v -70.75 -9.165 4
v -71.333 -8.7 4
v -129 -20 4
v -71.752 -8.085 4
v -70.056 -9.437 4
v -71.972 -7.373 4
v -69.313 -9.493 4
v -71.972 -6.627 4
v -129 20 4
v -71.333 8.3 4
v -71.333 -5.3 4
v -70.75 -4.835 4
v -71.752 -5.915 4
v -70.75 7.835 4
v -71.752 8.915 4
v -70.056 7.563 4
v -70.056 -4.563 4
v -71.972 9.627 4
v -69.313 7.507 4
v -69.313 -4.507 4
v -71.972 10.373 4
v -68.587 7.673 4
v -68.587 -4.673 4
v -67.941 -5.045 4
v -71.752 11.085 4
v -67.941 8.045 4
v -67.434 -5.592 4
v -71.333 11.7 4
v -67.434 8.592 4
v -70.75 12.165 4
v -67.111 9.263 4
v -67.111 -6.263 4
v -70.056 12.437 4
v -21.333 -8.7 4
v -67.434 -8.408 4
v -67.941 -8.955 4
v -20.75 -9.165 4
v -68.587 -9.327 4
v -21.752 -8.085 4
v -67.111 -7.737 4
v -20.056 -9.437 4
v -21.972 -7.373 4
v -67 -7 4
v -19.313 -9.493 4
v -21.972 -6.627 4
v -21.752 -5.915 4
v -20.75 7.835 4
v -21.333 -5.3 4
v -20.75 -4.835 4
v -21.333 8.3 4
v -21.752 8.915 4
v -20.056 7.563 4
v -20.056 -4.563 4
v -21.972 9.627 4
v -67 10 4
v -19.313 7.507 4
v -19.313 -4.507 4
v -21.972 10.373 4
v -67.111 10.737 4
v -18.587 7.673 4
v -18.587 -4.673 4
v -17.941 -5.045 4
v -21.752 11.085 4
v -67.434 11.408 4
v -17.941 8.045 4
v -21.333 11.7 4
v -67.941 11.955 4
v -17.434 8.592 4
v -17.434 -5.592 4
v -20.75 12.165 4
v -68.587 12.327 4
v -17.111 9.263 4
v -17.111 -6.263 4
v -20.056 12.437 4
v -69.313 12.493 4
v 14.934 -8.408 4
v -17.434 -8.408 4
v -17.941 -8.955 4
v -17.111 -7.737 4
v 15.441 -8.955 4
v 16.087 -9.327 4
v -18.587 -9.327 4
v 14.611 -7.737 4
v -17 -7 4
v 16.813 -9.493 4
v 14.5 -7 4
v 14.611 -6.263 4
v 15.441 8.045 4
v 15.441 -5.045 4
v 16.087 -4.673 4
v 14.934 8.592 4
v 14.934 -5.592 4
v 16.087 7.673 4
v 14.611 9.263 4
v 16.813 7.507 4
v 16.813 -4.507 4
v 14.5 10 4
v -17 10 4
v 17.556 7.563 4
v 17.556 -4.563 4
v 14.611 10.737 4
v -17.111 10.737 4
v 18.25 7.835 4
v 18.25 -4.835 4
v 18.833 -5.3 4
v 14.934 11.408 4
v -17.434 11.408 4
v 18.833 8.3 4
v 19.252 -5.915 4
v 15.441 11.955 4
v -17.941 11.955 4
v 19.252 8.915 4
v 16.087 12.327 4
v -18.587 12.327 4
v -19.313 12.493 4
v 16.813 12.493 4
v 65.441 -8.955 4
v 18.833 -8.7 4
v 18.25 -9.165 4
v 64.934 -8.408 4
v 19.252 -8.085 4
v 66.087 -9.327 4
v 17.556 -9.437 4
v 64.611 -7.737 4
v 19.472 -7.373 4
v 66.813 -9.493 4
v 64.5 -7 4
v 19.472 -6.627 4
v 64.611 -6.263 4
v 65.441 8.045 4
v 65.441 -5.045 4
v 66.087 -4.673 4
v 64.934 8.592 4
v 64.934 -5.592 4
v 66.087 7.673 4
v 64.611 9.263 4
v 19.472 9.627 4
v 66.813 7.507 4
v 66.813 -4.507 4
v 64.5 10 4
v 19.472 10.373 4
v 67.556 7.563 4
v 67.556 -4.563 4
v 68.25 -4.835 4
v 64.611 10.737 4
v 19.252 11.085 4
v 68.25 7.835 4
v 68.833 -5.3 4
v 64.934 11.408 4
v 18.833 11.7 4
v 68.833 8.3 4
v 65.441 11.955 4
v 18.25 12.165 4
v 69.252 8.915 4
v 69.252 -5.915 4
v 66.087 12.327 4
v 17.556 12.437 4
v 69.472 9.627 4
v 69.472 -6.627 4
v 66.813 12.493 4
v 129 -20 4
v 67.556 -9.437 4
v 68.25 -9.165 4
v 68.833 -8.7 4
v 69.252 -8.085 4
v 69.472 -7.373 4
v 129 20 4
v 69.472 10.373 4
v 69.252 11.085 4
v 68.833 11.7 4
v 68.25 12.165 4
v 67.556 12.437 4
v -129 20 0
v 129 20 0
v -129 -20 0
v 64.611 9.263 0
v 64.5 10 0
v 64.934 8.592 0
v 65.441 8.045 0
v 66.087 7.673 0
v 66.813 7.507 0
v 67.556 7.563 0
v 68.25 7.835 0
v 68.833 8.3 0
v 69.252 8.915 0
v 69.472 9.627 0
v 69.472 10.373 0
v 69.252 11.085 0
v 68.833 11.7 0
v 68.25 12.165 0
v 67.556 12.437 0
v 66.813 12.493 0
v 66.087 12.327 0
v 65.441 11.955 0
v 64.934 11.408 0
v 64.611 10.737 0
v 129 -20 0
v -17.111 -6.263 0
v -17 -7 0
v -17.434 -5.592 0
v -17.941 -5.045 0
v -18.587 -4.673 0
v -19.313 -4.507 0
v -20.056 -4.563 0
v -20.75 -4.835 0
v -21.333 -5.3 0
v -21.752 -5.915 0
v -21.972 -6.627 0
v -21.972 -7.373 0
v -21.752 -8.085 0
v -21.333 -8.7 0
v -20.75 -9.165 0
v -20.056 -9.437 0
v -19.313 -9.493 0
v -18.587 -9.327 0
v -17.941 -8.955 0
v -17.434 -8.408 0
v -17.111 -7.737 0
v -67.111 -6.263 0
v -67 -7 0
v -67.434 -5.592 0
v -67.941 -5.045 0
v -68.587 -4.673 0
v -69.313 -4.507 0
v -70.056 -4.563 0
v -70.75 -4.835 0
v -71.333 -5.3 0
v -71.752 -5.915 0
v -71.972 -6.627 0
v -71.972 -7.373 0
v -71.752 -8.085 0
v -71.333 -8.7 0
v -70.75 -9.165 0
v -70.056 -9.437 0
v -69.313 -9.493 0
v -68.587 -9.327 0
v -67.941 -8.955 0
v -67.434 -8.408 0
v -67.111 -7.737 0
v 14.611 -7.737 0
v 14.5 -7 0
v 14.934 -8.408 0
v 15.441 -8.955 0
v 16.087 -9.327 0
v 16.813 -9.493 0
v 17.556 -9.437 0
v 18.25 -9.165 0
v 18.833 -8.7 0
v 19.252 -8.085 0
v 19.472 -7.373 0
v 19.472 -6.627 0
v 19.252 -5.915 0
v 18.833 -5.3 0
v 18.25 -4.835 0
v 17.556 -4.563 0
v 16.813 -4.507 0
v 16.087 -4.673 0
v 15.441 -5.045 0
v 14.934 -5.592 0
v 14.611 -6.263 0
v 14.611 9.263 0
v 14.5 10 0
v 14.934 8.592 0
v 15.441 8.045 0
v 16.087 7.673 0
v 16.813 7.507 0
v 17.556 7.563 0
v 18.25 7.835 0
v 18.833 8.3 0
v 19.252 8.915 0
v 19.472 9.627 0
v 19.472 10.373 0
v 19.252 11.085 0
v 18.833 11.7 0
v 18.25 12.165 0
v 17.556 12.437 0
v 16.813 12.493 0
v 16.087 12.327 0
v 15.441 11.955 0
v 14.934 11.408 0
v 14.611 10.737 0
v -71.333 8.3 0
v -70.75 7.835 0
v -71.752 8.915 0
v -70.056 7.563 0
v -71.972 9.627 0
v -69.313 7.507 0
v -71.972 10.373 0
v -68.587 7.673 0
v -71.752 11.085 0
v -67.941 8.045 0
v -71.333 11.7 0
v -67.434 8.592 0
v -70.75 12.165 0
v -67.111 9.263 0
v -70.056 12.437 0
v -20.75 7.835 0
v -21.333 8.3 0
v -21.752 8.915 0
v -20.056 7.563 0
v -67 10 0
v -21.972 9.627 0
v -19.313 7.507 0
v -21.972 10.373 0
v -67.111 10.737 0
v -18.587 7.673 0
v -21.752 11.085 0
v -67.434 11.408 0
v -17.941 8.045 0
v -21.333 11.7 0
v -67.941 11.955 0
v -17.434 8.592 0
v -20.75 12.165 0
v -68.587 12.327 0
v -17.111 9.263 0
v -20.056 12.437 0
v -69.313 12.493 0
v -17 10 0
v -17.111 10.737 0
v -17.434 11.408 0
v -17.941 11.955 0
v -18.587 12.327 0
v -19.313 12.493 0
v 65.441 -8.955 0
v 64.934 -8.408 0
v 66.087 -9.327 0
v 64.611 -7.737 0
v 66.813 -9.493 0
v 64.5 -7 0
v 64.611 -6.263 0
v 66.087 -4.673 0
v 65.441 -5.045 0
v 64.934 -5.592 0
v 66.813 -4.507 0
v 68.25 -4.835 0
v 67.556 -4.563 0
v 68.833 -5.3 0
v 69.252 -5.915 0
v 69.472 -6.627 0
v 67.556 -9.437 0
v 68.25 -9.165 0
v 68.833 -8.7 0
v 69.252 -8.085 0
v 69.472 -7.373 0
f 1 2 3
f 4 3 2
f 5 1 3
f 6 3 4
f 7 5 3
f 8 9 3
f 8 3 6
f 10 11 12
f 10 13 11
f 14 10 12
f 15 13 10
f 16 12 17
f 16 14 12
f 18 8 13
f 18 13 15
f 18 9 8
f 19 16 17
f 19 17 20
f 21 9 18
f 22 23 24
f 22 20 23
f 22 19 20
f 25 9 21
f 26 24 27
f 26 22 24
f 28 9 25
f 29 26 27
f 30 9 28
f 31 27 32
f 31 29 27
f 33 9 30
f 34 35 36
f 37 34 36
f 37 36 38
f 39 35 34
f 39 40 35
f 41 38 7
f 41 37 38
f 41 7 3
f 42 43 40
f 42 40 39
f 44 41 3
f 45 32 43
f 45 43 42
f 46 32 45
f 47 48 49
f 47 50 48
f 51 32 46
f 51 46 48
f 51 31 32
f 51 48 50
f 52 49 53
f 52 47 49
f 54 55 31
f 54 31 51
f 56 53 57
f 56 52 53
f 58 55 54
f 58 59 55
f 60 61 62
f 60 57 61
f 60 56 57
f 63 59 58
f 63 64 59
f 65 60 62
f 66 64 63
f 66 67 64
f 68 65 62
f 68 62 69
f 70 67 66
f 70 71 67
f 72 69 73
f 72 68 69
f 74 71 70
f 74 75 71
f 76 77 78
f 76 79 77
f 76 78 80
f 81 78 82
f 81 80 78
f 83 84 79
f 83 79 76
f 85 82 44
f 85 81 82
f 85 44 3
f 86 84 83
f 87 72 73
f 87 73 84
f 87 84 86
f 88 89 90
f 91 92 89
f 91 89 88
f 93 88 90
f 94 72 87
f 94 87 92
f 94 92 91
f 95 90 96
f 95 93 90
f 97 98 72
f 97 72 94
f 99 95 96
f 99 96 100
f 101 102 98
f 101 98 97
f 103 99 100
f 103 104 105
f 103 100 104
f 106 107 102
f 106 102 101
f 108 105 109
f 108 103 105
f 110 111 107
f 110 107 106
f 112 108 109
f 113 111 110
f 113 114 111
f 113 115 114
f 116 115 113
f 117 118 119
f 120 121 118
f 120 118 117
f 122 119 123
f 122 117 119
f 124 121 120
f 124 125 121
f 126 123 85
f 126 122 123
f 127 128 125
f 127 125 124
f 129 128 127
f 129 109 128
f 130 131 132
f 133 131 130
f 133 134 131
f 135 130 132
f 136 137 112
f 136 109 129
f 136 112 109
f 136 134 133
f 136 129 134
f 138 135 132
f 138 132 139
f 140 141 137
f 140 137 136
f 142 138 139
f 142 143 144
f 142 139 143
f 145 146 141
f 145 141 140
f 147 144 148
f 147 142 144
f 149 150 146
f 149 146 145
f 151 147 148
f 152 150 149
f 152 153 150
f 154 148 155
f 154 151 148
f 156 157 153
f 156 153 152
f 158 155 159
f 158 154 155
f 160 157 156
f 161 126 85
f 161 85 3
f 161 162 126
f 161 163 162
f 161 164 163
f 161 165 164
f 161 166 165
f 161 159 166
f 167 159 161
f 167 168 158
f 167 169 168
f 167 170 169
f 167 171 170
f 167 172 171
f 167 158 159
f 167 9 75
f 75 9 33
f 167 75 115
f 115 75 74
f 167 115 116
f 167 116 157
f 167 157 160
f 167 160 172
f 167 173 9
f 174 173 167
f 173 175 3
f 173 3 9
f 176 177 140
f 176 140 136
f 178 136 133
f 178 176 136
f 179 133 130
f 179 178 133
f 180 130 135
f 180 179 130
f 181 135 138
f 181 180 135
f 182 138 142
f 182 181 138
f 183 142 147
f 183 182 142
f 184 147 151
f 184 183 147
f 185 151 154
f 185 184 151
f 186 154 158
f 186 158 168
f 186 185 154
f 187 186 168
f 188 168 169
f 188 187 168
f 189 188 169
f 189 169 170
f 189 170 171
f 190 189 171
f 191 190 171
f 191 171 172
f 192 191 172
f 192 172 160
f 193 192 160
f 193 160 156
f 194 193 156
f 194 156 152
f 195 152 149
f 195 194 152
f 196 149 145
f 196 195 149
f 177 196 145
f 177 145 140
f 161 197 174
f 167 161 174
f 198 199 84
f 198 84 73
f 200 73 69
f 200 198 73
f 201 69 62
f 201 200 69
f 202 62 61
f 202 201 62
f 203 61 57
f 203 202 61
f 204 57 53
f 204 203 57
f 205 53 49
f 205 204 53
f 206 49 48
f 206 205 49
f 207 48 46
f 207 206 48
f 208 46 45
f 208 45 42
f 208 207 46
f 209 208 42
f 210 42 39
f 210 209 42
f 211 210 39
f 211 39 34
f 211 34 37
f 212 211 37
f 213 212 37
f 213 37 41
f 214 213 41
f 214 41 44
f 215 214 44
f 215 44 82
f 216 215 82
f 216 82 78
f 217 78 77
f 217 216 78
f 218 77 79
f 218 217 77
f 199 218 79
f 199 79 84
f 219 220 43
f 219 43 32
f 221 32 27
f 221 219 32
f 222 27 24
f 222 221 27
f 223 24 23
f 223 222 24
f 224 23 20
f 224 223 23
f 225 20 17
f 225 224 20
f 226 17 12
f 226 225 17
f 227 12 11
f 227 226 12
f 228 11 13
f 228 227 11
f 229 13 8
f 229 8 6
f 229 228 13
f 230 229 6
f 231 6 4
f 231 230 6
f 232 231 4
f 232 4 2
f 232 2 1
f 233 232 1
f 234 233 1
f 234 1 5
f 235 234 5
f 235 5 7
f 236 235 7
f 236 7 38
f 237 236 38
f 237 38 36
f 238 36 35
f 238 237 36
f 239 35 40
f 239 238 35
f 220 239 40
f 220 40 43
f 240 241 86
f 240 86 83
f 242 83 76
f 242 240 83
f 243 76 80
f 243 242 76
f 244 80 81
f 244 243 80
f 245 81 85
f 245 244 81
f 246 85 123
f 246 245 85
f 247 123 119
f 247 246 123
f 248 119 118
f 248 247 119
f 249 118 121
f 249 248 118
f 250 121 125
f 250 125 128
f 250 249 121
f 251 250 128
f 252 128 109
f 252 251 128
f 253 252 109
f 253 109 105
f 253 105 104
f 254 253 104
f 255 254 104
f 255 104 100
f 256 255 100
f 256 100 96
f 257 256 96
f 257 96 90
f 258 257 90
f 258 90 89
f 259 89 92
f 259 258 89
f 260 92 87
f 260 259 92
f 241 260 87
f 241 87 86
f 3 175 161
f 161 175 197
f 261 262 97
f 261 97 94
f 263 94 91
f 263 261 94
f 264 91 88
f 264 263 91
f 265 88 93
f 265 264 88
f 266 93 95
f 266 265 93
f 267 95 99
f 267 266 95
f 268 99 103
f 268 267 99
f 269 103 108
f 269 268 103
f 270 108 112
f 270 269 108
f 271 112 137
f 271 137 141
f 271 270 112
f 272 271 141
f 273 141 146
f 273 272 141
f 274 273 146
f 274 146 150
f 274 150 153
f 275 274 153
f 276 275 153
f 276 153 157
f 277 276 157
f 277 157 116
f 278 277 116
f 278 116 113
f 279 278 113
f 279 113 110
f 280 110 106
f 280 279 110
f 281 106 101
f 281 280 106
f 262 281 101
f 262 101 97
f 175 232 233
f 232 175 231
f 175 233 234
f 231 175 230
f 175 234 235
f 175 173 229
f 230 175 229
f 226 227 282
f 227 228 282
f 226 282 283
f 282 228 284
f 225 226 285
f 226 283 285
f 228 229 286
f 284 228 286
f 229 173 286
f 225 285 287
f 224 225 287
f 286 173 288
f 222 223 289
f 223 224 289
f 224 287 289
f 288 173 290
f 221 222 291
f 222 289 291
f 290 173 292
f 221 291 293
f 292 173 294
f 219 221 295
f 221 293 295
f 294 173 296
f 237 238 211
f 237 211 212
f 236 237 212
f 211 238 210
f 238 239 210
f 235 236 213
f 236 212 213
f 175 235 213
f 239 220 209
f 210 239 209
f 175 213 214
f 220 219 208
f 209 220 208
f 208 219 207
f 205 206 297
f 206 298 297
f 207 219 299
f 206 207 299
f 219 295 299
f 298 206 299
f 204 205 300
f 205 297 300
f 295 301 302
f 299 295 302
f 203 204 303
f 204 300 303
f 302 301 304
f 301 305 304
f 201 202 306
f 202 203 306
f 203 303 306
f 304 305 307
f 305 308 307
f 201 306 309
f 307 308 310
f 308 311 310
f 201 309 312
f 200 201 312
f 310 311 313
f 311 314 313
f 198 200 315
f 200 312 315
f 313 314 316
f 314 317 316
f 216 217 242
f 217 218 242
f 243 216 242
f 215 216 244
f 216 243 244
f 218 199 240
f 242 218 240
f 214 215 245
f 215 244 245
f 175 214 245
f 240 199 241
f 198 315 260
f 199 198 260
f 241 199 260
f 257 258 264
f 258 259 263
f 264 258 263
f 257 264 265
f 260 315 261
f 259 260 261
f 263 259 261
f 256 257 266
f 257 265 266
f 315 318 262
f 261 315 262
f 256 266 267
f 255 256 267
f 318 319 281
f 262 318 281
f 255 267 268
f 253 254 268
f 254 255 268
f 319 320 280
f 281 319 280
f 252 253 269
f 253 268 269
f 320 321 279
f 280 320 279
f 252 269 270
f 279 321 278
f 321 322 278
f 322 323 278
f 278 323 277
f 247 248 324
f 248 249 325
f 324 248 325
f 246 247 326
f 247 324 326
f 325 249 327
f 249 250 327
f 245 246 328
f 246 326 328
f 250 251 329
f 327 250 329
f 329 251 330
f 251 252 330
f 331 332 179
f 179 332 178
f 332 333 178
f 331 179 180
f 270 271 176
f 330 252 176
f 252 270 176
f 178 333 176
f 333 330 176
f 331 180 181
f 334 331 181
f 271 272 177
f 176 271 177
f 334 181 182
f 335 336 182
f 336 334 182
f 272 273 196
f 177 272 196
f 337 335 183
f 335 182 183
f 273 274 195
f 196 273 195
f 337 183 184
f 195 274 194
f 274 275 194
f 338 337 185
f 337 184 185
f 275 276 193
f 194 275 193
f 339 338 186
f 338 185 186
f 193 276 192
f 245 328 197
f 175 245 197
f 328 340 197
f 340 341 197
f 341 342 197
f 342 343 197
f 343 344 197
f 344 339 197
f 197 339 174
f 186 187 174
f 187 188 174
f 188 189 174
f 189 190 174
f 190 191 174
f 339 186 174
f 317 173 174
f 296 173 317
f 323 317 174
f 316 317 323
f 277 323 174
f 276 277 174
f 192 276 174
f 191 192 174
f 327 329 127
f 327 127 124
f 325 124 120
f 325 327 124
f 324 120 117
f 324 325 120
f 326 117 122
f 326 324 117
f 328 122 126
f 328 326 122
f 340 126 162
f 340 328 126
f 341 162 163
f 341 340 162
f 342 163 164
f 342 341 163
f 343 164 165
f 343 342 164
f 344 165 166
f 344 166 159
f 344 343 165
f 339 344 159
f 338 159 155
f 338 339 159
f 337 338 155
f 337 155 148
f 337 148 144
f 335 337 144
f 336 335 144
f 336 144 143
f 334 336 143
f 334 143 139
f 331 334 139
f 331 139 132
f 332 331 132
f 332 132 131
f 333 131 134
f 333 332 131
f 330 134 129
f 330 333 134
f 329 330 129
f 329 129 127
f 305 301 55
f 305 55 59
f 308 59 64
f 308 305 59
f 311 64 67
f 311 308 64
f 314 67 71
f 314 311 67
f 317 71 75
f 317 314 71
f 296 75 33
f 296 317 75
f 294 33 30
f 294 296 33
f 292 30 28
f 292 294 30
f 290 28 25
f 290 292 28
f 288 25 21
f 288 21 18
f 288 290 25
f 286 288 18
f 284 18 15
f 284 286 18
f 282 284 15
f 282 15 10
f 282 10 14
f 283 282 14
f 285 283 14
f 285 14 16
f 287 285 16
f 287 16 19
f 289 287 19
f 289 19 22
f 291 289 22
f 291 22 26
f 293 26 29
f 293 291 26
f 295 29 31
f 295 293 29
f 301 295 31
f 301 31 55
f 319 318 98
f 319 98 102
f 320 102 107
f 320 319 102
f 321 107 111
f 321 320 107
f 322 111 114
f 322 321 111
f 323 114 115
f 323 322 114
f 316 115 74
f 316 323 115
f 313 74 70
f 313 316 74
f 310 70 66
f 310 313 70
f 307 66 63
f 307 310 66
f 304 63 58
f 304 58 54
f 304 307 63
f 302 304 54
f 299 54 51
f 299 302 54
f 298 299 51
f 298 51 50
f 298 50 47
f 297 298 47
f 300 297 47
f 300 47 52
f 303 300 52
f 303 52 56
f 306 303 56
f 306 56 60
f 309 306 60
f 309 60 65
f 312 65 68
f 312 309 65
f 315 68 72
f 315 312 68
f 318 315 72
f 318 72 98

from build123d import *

# Parameters (mm, degrees)
SKETCH1_W           = 258
SKETCH1_H           = 40
SKETCH1_R           = 2.5
BOSS_EXTRUDE1_DEPTH = 4


with BuildPart() as part:
    # Sketch1 → Boss-Extrude1 (new body)
    with BuildSketch(Plane.XY):
        Rectangle(SKETCH1_W, SKETCH1_H)
        with Locations((-69.5, 10)):
            Circle(SKETCH1_R, mode=Mode.SUBTRACT)
        with Locations((-19.5, 10)):
            Circle(SKETCH1_R, mode=Mode.SUBTRACT)
        with Locations(Location((17, 10, 0), (0, 0, 180))):
            Circle(SKETCH1_R, mode=Mode.SUBTRACT)
        with Locations(Location((67, 10, 0), (0, 0, 180))):
            Circle(SKETCH1_R, mode=Mode.SUBTRACT)
        with Locations((-69.5, -7)):
            Circle(SKETCH1_R, mode=Mode.SUBTRACT)
        with Locations((-19.5, -7)):
            Circle(SKETCH1_R, mode=Mode.SUBTRACT)
        with Locations(Location((17, -7, 0), (0, 0, 180))):
            Circle(SKETCH1_R, mode=Mode.SUBTRACT)
        with Locations(Location((67, -7, 0), (0, 0, 180))):
            Circle(SKETCH1_R, mode=Mode.SUBTRACT)
    extrude(amount=BOSS_EXTRUDE1_DEPTH)


solid = part.part
